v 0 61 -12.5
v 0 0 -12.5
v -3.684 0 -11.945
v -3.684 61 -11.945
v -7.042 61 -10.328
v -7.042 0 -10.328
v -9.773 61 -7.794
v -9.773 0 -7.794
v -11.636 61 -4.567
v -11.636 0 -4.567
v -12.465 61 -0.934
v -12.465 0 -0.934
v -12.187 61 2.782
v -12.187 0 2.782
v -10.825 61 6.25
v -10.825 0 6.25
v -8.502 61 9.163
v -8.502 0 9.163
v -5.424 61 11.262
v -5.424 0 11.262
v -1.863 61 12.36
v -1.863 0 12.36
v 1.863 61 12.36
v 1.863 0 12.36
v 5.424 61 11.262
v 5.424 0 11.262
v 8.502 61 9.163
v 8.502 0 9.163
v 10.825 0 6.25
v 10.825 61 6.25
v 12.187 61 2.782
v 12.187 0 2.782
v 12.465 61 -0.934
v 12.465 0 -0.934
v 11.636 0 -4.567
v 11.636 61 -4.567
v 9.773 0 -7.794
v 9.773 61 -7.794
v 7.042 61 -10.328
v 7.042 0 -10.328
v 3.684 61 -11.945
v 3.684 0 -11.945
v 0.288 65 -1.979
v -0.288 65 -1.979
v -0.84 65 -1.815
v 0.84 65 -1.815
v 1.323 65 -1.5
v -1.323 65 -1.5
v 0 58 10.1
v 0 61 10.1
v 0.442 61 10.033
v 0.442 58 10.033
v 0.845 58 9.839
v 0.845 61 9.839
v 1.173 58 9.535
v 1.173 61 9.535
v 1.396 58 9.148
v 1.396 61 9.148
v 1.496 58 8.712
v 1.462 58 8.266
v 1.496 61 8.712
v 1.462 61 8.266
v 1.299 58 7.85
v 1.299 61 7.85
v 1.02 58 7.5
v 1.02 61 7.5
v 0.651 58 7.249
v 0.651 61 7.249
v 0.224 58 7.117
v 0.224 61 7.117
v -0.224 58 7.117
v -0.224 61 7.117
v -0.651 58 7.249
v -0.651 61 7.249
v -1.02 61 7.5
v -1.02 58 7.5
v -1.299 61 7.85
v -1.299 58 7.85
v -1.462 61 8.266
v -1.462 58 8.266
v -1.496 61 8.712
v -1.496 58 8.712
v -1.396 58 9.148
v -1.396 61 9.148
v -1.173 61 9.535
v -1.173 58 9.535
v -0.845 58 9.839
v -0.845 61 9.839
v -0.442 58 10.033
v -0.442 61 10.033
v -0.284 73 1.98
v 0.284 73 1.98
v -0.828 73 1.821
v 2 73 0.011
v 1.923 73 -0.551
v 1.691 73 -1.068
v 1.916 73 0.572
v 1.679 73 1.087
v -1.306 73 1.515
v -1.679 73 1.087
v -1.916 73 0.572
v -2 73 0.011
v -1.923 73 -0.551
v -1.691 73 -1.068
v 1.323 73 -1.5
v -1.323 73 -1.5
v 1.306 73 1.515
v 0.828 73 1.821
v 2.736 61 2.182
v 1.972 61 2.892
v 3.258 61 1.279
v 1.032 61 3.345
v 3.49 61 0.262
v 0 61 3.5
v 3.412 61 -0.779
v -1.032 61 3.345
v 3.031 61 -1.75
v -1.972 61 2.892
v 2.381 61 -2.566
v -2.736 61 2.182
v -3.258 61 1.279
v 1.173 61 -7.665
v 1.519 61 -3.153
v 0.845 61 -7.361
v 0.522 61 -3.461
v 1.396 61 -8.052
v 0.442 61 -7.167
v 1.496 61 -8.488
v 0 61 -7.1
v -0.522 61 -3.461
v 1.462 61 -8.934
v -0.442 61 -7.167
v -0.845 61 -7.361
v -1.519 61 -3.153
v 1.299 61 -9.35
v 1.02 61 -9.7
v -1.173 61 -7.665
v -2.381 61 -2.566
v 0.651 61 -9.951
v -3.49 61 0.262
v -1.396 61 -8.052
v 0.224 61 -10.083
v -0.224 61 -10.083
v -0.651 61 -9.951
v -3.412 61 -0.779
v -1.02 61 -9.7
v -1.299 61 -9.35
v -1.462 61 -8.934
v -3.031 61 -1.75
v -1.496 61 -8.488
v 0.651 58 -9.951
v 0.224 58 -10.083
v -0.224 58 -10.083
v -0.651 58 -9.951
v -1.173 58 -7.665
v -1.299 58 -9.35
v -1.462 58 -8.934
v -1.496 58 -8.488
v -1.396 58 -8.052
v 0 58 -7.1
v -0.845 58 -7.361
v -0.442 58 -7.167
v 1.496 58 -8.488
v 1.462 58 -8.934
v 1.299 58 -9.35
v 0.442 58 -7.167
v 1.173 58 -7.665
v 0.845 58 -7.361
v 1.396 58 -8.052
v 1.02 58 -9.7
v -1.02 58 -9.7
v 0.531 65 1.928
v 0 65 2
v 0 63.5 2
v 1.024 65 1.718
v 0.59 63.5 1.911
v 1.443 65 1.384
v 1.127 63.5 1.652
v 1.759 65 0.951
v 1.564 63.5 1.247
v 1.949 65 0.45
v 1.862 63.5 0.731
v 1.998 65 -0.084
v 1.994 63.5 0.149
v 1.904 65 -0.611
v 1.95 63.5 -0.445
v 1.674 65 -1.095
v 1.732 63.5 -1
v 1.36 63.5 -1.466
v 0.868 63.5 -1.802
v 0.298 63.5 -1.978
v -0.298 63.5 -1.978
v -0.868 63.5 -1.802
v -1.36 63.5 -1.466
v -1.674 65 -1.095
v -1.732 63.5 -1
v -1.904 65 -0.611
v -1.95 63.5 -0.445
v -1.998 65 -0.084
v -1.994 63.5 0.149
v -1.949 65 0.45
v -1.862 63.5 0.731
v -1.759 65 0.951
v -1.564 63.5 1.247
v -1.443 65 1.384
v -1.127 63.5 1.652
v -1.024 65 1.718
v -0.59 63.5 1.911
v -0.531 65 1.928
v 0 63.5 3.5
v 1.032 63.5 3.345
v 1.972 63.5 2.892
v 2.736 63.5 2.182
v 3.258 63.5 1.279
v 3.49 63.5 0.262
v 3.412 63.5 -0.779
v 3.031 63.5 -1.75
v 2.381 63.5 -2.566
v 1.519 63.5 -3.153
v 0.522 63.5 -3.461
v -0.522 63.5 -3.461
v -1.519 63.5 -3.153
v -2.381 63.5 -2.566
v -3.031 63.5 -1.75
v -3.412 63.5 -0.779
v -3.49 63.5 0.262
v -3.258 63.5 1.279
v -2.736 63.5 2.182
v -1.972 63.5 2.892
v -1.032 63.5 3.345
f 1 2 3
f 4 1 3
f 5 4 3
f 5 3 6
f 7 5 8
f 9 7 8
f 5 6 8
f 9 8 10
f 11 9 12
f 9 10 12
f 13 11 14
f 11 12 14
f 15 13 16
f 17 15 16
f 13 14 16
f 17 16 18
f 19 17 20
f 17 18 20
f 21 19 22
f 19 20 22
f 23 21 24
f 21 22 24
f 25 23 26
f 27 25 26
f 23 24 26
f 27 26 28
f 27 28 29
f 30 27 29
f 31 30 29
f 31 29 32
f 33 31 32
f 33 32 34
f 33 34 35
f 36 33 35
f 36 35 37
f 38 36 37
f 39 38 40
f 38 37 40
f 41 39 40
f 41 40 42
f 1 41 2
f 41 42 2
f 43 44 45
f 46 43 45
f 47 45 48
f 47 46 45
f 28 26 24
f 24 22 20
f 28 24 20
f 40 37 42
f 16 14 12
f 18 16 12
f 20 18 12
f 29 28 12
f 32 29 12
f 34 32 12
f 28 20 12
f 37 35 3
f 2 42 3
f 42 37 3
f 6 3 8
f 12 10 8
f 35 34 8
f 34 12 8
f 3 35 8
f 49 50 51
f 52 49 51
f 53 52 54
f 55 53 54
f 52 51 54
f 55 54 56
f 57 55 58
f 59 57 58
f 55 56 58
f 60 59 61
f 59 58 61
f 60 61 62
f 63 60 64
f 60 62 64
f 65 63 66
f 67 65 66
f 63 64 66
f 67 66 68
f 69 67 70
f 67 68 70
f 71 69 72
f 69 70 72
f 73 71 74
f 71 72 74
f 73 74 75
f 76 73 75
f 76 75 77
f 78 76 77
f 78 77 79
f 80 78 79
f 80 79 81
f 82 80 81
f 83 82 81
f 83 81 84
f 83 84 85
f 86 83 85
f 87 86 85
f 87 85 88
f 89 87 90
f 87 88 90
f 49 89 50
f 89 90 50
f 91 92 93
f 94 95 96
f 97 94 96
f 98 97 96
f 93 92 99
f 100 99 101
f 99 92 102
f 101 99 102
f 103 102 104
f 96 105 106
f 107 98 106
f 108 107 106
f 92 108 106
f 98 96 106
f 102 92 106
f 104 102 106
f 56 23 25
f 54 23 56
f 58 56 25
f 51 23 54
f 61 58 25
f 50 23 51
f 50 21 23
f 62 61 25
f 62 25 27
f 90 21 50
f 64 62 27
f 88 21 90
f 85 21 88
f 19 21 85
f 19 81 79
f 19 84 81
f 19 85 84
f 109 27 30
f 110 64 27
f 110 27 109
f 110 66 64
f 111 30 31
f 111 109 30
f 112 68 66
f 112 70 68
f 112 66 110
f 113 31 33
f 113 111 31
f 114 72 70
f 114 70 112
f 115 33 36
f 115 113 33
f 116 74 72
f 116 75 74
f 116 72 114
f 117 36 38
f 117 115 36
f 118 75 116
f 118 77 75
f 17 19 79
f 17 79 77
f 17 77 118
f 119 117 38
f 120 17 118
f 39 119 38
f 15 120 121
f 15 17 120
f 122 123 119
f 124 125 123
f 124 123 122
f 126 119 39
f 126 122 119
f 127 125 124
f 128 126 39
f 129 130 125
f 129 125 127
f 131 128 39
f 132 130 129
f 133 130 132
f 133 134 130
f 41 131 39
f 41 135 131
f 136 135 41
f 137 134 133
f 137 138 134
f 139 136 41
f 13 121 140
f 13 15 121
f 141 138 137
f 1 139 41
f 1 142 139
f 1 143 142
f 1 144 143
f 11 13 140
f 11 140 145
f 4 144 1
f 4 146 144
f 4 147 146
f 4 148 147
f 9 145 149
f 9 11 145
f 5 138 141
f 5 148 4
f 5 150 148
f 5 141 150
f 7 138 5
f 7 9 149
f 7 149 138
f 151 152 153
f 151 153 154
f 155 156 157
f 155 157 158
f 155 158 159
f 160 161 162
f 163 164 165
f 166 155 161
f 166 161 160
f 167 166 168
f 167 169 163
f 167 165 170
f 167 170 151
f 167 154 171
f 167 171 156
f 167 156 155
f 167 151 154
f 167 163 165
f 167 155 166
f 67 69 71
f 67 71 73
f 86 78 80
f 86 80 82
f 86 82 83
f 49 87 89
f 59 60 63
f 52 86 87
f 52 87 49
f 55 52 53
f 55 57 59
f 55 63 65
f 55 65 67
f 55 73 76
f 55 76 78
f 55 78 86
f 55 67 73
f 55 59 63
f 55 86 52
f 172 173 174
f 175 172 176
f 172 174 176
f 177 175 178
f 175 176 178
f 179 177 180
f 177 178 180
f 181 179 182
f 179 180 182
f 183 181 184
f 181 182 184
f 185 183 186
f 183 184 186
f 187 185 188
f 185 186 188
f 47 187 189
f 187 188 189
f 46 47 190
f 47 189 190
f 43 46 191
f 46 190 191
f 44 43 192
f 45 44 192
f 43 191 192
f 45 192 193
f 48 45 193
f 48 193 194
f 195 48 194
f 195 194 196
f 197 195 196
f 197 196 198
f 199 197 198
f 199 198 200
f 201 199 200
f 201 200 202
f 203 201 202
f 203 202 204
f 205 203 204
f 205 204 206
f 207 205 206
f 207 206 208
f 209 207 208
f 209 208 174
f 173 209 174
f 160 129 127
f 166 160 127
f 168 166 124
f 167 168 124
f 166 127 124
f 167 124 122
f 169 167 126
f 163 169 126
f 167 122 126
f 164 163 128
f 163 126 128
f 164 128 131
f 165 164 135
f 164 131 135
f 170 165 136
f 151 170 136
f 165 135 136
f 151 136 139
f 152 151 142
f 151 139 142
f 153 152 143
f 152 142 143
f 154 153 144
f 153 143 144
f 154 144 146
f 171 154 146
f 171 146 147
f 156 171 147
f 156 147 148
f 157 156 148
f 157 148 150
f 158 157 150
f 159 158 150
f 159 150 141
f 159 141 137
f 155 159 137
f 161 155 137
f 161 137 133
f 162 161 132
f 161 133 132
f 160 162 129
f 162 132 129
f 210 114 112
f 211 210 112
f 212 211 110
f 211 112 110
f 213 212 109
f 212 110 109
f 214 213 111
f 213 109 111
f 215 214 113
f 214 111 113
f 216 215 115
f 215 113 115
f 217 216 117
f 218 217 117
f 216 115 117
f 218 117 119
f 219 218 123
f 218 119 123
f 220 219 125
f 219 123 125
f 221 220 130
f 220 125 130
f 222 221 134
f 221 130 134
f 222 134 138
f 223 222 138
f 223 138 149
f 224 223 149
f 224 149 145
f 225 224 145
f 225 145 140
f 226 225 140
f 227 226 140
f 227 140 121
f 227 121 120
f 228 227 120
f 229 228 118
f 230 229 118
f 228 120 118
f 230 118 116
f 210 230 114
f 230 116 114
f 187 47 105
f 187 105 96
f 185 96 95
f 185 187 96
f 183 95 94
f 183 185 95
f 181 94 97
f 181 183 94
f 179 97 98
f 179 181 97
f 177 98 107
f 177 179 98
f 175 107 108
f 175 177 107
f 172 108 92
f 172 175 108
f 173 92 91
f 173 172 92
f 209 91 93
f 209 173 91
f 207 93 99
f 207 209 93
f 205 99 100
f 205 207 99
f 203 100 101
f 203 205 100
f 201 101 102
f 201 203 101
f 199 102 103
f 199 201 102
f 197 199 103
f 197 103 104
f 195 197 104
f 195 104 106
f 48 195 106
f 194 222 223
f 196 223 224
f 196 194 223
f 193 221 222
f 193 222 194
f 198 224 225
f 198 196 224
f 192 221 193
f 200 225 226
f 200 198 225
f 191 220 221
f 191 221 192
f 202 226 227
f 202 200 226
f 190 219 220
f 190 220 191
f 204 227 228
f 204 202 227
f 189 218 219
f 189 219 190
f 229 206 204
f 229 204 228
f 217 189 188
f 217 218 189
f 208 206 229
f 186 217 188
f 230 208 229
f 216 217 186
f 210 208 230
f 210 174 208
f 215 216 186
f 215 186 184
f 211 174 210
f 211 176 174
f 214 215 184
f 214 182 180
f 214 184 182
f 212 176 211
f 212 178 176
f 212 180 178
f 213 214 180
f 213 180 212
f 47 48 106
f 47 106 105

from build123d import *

# Parameters (mm, degrees)
SKETCH1_R           = 12.5
BOSS_EXTRUDE1_DEPTH = 61
SKETCH2_R           = 3.5
BOSS_EXTRUDE2_DEPTH = 2.5
SKETCH3_R           = 2
BOSS_EXTRUDE3_DEPTH = 1.5
BOSS_EXTRUDE4_DEPTH = 8
SKETCH5_R           = 1.5
CUT_EXTRUDE1_DEPTH  = 3


with BuildPart() as part:
    # Sketch1 → Boss-Extrude1 (new body)
    with BuildSketch(Plane(origin=(0, 0, 0), x_dir=(1, 0, 0), z_dir=(0, 1, 0))):
        with Locations(Location((0, 0, 0), (0, 0, 90))):
            Circle(SKETCH1_R)
    extrude(amount=BOSS_EXTRUDE1_DEPTH)

    # Sketch2 → Boss-Extrude2 (add)
    with BuildSketch(Plane(origin=(0, 61, 0), x_dir=(1, 0, 0), z_dir=(0, 1, 0))):
        with Locations(Location((0, 0, 0), (0, 0, 270))):
            Circle(SKETCH2_R)
    extrude(amount=BOSS_EXTRUDE2_DEPTH)

    # Sketch3 → Boss-Extrude3 (add)
    with BuildSketch(Plane(origin=(0, 63.5, 0), x_dir=(1, 0, 0), z_dir=(0, 1, 0))):
        with Locations(Location((0, 0, 0), (0, 0, 270))):
            Circle(SKETCH3_R)
    extrude(amount=BOSS_EXTRUDE3_DEPTH)

    # Sketch4 → Boss-Extrude4 (add)
    with BuildSketch(Plane(origin=(0, 65, 0), x_dir=(1, 0, 0), z_dir=(0, 1, 0))):
        with BuildLine():
            Line((-1.322876, 1.5), (1.322876, 1.5))
            ThreePointArc((1.322876, 1.5), (0, -2), (-1.322876, 1.5))
        make_face()
    extrude(amount=BOSS_EXTRUDE4_DEPTH)

    # Sketch5 → Cut-Extrude1 (cut)
    with BuildSketch(Plane(origin=(0, 61, 0), x_dir=(1, 0, 0), z_dir=(0, 1, 0))):
        with Locations(Location((0, 8.6, 0), (0, 0, 270))):
            Circle(SKETCH5_R)
        with Locations(Location((0, -8.6, 0), (0, 0, 270))):
            Circle(SKETCH5_R)
    extrude(amount=-CUT_EXTRUDE1_DEPTH, mode=Mode.SUBTRACT)


solid = part.part
